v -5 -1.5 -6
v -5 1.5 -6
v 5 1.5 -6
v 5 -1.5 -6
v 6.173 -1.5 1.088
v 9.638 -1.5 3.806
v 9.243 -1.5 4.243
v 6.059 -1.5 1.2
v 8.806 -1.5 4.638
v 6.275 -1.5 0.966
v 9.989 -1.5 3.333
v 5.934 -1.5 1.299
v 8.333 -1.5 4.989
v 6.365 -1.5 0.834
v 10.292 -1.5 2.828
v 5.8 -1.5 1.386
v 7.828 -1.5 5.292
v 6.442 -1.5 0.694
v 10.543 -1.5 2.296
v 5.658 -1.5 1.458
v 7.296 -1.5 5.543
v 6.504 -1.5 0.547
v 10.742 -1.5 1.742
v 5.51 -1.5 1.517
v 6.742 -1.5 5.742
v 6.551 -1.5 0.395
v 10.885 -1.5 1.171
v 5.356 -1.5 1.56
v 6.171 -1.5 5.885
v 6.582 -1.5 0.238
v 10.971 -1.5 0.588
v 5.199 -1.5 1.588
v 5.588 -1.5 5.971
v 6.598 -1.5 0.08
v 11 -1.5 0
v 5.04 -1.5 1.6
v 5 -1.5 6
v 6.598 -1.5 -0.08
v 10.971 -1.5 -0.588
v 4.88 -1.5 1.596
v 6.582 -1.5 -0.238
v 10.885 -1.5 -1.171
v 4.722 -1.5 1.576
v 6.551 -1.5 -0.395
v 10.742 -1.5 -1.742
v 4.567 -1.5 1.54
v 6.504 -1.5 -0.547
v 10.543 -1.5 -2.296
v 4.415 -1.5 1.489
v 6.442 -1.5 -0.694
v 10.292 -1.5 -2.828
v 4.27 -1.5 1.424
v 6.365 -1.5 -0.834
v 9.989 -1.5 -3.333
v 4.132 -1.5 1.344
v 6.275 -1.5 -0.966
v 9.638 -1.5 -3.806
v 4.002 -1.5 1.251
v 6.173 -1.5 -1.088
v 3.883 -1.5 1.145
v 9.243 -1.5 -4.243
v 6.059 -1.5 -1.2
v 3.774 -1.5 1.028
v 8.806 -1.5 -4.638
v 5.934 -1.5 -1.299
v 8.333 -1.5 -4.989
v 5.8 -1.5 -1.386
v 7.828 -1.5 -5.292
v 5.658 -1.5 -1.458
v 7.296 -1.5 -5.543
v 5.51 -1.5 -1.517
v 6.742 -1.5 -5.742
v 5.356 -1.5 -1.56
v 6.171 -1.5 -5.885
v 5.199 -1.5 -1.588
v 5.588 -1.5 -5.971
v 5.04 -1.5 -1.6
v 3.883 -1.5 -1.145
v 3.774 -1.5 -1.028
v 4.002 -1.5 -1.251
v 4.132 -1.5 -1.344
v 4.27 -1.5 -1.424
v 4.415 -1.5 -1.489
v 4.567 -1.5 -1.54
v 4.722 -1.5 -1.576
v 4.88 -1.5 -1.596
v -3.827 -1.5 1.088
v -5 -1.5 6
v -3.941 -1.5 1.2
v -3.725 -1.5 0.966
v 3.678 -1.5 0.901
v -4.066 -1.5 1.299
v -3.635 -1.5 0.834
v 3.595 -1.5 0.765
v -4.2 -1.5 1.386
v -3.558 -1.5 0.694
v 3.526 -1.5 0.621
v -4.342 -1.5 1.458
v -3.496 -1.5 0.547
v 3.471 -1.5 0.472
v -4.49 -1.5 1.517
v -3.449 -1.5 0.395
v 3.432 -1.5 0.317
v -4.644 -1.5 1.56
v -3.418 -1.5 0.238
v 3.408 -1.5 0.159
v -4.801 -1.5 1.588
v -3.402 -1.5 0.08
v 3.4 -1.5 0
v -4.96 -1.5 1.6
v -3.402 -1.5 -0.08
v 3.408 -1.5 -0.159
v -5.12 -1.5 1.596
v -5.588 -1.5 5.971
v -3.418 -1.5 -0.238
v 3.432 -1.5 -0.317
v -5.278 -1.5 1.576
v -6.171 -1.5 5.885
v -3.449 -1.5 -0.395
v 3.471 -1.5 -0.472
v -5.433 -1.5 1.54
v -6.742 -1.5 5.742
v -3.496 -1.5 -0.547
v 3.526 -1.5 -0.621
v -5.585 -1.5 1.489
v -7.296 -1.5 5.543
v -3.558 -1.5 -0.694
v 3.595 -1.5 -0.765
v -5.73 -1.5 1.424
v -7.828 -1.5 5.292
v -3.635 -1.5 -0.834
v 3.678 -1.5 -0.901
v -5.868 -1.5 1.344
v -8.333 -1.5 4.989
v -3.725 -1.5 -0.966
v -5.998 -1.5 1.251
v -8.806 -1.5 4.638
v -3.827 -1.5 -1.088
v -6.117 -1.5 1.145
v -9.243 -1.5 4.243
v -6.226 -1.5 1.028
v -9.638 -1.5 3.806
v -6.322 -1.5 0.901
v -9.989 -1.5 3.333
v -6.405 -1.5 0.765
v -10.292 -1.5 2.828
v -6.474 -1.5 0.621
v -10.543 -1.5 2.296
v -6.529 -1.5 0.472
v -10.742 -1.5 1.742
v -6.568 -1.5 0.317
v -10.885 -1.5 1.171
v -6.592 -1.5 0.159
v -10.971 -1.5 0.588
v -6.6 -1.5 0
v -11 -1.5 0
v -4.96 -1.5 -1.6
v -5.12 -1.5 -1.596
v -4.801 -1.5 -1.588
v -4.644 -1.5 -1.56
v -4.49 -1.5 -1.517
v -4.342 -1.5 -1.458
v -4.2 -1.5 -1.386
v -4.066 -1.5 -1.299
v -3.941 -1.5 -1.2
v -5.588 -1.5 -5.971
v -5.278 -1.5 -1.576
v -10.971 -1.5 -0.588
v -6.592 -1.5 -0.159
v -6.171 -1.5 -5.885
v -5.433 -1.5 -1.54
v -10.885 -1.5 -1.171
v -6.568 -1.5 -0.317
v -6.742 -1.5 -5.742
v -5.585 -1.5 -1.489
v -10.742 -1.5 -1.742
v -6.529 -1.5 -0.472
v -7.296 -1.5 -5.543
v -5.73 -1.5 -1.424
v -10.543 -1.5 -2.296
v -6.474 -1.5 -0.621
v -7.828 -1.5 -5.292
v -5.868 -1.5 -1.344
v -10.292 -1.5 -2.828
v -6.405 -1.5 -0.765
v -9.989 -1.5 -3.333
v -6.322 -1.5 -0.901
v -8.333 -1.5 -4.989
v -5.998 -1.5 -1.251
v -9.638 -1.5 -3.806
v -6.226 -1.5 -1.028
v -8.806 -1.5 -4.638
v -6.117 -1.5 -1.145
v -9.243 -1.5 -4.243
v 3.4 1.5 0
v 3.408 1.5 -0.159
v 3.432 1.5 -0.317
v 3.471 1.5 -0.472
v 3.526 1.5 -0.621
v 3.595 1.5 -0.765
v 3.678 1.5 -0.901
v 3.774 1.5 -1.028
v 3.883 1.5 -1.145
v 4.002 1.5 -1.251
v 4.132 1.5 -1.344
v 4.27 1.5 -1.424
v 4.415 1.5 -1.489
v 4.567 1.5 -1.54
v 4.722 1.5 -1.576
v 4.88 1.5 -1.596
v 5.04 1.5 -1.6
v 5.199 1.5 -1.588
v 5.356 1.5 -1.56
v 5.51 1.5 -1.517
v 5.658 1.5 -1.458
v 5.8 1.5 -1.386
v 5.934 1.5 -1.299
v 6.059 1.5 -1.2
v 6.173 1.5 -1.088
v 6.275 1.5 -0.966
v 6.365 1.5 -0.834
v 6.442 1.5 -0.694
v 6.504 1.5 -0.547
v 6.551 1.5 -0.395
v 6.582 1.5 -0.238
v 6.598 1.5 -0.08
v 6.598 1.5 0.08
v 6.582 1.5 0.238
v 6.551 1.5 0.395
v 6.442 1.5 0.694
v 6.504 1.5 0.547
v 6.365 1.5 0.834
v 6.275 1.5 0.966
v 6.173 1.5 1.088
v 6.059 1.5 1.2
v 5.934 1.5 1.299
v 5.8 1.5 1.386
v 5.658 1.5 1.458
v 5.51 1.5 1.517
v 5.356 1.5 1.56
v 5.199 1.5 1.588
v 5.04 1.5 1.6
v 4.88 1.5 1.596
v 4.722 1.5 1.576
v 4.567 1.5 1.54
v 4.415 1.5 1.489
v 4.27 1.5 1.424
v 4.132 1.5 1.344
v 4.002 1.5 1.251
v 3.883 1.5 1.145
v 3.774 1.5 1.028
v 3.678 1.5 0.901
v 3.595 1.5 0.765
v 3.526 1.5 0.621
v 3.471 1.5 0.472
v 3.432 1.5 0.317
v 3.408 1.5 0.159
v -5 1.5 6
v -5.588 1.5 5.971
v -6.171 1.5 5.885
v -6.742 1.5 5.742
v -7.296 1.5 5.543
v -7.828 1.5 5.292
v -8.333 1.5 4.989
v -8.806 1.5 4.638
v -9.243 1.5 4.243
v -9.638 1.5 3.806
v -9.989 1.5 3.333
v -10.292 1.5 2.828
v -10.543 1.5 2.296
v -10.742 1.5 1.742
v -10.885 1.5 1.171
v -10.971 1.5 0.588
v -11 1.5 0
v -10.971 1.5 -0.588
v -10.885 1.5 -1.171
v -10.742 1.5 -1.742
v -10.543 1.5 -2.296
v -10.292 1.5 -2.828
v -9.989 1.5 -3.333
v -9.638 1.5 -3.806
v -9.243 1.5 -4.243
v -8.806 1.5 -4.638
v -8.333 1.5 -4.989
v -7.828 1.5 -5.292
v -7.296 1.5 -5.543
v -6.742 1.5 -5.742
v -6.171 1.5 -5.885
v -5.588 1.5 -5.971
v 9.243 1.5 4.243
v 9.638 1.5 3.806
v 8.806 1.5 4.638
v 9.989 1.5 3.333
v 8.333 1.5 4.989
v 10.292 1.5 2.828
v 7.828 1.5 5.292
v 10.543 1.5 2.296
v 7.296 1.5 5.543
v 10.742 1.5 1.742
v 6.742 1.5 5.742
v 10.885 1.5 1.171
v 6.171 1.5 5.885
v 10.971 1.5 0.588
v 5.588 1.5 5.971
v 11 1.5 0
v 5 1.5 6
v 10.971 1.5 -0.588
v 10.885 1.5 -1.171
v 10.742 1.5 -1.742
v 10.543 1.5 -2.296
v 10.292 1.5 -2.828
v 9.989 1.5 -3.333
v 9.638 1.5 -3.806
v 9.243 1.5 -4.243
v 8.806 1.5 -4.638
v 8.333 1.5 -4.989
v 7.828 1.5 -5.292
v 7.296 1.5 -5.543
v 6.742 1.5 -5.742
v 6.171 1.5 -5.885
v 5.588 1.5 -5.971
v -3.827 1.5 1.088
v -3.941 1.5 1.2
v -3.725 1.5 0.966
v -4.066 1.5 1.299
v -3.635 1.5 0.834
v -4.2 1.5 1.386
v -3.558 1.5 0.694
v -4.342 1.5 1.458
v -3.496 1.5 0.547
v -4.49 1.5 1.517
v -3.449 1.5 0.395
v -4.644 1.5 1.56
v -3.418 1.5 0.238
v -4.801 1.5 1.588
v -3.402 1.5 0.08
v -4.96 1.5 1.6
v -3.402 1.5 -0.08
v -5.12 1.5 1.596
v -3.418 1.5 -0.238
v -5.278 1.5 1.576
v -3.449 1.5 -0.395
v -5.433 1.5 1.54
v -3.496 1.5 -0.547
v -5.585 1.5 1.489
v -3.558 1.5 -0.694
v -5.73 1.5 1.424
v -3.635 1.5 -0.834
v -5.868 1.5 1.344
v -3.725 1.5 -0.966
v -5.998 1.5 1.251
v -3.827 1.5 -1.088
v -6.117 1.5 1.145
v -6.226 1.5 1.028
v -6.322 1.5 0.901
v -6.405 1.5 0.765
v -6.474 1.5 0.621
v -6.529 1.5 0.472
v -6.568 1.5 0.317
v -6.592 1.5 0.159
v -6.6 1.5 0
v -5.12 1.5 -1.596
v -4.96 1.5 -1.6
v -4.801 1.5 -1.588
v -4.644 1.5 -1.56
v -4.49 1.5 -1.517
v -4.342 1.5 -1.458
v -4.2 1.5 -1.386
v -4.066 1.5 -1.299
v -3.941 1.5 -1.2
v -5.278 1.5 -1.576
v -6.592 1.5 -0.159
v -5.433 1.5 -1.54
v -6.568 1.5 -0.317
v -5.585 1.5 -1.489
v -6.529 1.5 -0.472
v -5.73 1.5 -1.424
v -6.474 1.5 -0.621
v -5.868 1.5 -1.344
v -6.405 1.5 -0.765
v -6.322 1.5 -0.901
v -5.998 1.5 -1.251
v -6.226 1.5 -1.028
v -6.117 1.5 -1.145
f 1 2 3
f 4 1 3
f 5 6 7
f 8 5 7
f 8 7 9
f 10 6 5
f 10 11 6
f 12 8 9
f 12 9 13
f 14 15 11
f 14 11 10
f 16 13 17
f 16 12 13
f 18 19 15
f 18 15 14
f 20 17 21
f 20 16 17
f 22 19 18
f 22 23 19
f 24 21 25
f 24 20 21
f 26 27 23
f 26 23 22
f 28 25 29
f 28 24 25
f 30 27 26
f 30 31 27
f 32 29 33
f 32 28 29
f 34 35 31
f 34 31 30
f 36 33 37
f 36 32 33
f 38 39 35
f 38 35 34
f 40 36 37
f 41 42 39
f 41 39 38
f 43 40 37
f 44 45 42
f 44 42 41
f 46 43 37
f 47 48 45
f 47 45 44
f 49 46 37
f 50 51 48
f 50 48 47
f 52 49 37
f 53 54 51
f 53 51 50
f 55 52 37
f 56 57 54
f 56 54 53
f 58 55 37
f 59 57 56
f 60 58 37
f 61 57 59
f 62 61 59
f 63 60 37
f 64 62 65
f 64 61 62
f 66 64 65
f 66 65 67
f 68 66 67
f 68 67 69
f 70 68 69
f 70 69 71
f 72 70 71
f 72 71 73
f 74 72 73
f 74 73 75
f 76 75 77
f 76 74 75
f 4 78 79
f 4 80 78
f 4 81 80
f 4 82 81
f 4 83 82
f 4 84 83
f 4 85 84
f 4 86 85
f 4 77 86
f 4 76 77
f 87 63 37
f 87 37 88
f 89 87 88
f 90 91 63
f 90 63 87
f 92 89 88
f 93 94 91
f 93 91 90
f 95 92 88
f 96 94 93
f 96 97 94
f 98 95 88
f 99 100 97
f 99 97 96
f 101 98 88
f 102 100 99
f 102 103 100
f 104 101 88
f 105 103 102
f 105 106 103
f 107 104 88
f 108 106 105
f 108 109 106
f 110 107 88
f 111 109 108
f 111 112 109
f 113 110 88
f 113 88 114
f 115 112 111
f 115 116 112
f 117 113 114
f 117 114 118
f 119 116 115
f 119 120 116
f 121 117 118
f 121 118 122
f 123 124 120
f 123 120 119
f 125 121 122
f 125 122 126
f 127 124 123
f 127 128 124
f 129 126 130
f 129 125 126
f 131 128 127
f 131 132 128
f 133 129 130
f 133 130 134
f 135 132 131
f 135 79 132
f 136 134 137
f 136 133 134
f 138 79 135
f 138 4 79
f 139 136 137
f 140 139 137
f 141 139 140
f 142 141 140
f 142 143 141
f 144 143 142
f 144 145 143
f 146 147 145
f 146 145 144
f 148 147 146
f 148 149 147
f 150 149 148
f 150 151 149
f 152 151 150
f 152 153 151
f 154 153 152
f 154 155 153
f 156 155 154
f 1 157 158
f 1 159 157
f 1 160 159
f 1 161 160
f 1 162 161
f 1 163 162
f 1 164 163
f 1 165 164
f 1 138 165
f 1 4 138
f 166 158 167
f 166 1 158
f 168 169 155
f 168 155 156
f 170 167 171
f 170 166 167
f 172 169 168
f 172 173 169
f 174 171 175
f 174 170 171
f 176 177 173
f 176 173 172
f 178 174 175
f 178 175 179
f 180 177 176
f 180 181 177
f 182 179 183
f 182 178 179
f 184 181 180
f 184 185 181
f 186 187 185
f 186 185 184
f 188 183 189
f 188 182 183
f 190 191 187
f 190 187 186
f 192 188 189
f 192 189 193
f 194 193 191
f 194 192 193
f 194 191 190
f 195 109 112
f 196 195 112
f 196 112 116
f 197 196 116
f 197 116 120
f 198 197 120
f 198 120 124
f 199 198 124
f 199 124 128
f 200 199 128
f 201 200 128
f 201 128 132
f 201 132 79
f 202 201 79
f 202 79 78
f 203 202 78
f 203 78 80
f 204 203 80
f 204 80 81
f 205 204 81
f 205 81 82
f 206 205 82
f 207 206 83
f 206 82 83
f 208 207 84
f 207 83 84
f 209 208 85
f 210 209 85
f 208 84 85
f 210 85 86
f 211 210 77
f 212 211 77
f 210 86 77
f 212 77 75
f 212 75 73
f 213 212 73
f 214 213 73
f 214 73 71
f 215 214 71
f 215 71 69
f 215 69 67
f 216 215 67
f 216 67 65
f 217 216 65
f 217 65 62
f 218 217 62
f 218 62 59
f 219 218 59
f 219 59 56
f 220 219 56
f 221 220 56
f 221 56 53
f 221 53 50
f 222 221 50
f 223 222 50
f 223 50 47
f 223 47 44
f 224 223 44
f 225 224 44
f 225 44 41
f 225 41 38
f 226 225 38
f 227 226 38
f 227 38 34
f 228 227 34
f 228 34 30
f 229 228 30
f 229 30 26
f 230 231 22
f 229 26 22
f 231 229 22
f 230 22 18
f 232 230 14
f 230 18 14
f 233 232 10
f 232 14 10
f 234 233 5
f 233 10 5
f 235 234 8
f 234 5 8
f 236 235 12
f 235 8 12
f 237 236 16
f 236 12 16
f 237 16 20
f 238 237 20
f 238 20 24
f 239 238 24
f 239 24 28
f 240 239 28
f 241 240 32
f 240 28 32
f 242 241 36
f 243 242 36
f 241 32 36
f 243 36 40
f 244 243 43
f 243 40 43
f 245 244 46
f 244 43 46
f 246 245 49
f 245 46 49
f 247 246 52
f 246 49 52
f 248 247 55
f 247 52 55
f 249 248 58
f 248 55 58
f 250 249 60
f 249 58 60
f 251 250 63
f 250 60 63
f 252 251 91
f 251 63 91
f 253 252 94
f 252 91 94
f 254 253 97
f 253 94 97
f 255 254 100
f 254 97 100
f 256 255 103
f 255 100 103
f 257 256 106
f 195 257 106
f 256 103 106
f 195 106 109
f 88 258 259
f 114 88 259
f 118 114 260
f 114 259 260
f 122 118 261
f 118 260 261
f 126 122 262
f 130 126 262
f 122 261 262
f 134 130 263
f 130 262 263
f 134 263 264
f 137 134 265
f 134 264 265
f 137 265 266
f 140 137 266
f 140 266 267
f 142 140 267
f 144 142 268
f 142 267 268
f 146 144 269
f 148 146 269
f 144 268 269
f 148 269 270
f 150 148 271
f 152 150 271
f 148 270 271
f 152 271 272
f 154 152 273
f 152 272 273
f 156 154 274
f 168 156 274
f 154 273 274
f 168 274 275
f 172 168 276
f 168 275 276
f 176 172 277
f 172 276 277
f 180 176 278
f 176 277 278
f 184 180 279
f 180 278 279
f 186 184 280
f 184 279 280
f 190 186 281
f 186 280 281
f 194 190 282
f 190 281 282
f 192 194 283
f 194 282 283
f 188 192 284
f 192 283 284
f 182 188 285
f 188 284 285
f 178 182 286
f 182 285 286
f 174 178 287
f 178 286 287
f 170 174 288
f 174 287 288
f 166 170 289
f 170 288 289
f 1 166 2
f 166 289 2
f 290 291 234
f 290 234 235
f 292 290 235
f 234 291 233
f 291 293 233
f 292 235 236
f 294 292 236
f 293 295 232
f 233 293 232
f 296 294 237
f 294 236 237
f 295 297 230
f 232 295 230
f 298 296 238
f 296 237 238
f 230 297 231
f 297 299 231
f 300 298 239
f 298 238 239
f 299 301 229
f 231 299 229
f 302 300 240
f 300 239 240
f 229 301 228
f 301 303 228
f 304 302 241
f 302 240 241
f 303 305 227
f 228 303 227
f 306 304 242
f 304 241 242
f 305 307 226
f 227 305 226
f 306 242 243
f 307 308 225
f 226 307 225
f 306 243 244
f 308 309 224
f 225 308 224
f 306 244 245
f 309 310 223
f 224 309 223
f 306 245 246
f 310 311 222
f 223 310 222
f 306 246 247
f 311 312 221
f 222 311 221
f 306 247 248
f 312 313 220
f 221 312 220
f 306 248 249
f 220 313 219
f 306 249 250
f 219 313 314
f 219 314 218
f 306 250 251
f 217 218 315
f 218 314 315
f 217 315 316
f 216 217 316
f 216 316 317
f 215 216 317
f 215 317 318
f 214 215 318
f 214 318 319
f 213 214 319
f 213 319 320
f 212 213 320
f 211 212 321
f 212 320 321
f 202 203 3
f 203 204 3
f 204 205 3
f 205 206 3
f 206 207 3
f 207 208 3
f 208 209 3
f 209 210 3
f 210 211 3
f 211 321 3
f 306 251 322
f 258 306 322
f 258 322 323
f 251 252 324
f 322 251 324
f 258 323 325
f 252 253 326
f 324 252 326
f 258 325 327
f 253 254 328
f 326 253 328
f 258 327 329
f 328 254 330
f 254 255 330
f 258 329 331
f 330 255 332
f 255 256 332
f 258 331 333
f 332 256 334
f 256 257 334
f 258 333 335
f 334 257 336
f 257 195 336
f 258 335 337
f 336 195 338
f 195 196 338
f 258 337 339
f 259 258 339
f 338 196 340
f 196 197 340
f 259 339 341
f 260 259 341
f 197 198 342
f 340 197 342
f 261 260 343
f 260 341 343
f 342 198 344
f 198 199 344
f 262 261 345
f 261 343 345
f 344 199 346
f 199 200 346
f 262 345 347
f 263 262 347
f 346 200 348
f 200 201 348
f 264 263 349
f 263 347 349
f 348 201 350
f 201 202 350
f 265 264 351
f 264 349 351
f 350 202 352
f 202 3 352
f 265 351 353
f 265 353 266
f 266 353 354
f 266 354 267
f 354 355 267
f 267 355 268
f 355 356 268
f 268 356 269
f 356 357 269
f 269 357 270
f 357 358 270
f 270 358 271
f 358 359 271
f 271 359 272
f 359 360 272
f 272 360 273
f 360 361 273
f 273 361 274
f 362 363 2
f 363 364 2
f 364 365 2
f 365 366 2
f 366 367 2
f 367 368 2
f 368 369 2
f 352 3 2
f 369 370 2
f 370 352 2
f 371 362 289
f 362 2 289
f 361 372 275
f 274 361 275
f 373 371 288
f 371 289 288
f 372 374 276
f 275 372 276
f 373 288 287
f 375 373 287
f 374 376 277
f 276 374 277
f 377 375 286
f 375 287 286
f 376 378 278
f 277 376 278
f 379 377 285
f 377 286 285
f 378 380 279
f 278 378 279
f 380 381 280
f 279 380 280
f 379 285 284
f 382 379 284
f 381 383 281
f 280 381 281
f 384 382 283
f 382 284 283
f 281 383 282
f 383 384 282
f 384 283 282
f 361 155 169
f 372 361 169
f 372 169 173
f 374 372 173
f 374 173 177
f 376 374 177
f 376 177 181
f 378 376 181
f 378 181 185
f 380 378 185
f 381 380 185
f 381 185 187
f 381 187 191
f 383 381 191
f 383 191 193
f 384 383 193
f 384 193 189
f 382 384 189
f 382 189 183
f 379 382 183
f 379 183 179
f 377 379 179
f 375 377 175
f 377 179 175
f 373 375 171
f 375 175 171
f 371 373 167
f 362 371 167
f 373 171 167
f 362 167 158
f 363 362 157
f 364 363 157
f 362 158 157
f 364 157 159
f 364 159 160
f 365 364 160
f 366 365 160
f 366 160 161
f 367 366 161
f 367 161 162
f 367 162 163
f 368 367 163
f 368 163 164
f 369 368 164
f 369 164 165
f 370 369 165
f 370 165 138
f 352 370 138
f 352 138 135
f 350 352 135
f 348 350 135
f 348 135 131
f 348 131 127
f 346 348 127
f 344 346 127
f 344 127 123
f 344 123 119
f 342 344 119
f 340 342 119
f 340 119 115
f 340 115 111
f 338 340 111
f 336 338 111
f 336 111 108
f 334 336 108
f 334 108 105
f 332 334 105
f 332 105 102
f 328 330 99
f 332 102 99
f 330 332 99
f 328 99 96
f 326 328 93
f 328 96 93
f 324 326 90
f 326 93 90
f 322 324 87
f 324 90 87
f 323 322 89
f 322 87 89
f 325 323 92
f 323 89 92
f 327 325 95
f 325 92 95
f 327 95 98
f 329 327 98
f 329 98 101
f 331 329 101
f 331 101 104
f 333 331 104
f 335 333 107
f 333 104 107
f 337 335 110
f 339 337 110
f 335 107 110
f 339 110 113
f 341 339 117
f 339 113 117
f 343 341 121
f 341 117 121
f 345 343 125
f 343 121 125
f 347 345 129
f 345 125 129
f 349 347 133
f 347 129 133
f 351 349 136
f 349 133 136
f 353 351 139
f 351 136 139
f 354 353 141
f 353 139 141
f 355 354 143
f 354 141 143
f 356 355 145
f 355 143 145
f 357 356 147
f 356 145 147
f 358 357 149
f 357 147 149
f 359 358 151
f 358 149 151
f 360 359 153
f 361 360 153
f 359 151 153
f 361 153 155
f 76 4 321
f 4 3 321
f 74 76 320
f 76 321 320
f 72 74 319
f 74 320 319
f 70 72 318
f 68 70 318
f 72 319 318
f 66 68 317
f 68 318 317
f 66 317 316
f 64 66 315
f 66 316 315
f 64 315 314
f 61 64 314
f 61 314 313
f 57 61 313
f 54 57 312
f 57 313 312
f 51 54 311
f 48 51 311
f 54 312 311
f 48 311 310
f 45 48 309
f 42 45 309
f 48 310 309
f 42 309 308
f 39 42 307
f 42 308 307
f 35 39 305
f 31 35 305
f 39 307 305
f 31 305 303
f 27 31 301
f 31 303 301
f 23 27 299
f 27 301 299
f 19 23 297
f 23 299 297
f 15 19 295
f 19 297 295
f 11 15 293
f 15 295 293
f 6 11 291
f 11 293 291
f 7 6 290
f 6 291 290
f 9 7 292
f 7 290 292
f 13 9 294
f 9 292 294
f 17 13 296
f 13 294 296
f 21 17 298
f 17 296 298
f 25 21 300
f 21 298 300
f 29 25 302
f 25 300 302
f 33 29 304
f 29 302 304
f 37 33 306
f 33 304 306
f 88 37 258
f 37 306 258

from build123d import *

# Parameters (mm, degrees)
BOSS_EXTRUDE1_DEPTH      = 1.5
M3_CLEARANCE_HOLE1_D     = 3.2
M3_CLEARANCE_HOLE1_DEPTH = 3


with BuildPart() as part:
    # Sketch1 → Boss-Extrude1 (new body, symmetric)
    with BuildSketch(Plane(origin=(0, 0, 0), x_dir=(1, 0, 0), z_dir=(0, 1, 0))):
        with BuildLine():
            Line((-5, 6), (5, 6))
            ThreePointArc((5, 6), (11, 0), (5, -6))
            Line((5, -6), (-5, -6))
            ThreePointArc((-5, -6), (-11, 0), (-5, 6))
        make_face()
    extrude(amount=BOSS_EXTRUDE1_DEPTH, both=True)

    # M3 Clearance Hole1
    with Locations(Plane(origin=(0, 1.5, 0), x_dir=(1, 0, 0), z_dir=(0, 1, 0))):
        with Locations((-5, 0), (5, 0)):
            Hole(M3_CLEARANCE_HOLE1_D / 2, depth=M3_CLEARANCE_HOLE1_DEPTH)


solid = part.part
